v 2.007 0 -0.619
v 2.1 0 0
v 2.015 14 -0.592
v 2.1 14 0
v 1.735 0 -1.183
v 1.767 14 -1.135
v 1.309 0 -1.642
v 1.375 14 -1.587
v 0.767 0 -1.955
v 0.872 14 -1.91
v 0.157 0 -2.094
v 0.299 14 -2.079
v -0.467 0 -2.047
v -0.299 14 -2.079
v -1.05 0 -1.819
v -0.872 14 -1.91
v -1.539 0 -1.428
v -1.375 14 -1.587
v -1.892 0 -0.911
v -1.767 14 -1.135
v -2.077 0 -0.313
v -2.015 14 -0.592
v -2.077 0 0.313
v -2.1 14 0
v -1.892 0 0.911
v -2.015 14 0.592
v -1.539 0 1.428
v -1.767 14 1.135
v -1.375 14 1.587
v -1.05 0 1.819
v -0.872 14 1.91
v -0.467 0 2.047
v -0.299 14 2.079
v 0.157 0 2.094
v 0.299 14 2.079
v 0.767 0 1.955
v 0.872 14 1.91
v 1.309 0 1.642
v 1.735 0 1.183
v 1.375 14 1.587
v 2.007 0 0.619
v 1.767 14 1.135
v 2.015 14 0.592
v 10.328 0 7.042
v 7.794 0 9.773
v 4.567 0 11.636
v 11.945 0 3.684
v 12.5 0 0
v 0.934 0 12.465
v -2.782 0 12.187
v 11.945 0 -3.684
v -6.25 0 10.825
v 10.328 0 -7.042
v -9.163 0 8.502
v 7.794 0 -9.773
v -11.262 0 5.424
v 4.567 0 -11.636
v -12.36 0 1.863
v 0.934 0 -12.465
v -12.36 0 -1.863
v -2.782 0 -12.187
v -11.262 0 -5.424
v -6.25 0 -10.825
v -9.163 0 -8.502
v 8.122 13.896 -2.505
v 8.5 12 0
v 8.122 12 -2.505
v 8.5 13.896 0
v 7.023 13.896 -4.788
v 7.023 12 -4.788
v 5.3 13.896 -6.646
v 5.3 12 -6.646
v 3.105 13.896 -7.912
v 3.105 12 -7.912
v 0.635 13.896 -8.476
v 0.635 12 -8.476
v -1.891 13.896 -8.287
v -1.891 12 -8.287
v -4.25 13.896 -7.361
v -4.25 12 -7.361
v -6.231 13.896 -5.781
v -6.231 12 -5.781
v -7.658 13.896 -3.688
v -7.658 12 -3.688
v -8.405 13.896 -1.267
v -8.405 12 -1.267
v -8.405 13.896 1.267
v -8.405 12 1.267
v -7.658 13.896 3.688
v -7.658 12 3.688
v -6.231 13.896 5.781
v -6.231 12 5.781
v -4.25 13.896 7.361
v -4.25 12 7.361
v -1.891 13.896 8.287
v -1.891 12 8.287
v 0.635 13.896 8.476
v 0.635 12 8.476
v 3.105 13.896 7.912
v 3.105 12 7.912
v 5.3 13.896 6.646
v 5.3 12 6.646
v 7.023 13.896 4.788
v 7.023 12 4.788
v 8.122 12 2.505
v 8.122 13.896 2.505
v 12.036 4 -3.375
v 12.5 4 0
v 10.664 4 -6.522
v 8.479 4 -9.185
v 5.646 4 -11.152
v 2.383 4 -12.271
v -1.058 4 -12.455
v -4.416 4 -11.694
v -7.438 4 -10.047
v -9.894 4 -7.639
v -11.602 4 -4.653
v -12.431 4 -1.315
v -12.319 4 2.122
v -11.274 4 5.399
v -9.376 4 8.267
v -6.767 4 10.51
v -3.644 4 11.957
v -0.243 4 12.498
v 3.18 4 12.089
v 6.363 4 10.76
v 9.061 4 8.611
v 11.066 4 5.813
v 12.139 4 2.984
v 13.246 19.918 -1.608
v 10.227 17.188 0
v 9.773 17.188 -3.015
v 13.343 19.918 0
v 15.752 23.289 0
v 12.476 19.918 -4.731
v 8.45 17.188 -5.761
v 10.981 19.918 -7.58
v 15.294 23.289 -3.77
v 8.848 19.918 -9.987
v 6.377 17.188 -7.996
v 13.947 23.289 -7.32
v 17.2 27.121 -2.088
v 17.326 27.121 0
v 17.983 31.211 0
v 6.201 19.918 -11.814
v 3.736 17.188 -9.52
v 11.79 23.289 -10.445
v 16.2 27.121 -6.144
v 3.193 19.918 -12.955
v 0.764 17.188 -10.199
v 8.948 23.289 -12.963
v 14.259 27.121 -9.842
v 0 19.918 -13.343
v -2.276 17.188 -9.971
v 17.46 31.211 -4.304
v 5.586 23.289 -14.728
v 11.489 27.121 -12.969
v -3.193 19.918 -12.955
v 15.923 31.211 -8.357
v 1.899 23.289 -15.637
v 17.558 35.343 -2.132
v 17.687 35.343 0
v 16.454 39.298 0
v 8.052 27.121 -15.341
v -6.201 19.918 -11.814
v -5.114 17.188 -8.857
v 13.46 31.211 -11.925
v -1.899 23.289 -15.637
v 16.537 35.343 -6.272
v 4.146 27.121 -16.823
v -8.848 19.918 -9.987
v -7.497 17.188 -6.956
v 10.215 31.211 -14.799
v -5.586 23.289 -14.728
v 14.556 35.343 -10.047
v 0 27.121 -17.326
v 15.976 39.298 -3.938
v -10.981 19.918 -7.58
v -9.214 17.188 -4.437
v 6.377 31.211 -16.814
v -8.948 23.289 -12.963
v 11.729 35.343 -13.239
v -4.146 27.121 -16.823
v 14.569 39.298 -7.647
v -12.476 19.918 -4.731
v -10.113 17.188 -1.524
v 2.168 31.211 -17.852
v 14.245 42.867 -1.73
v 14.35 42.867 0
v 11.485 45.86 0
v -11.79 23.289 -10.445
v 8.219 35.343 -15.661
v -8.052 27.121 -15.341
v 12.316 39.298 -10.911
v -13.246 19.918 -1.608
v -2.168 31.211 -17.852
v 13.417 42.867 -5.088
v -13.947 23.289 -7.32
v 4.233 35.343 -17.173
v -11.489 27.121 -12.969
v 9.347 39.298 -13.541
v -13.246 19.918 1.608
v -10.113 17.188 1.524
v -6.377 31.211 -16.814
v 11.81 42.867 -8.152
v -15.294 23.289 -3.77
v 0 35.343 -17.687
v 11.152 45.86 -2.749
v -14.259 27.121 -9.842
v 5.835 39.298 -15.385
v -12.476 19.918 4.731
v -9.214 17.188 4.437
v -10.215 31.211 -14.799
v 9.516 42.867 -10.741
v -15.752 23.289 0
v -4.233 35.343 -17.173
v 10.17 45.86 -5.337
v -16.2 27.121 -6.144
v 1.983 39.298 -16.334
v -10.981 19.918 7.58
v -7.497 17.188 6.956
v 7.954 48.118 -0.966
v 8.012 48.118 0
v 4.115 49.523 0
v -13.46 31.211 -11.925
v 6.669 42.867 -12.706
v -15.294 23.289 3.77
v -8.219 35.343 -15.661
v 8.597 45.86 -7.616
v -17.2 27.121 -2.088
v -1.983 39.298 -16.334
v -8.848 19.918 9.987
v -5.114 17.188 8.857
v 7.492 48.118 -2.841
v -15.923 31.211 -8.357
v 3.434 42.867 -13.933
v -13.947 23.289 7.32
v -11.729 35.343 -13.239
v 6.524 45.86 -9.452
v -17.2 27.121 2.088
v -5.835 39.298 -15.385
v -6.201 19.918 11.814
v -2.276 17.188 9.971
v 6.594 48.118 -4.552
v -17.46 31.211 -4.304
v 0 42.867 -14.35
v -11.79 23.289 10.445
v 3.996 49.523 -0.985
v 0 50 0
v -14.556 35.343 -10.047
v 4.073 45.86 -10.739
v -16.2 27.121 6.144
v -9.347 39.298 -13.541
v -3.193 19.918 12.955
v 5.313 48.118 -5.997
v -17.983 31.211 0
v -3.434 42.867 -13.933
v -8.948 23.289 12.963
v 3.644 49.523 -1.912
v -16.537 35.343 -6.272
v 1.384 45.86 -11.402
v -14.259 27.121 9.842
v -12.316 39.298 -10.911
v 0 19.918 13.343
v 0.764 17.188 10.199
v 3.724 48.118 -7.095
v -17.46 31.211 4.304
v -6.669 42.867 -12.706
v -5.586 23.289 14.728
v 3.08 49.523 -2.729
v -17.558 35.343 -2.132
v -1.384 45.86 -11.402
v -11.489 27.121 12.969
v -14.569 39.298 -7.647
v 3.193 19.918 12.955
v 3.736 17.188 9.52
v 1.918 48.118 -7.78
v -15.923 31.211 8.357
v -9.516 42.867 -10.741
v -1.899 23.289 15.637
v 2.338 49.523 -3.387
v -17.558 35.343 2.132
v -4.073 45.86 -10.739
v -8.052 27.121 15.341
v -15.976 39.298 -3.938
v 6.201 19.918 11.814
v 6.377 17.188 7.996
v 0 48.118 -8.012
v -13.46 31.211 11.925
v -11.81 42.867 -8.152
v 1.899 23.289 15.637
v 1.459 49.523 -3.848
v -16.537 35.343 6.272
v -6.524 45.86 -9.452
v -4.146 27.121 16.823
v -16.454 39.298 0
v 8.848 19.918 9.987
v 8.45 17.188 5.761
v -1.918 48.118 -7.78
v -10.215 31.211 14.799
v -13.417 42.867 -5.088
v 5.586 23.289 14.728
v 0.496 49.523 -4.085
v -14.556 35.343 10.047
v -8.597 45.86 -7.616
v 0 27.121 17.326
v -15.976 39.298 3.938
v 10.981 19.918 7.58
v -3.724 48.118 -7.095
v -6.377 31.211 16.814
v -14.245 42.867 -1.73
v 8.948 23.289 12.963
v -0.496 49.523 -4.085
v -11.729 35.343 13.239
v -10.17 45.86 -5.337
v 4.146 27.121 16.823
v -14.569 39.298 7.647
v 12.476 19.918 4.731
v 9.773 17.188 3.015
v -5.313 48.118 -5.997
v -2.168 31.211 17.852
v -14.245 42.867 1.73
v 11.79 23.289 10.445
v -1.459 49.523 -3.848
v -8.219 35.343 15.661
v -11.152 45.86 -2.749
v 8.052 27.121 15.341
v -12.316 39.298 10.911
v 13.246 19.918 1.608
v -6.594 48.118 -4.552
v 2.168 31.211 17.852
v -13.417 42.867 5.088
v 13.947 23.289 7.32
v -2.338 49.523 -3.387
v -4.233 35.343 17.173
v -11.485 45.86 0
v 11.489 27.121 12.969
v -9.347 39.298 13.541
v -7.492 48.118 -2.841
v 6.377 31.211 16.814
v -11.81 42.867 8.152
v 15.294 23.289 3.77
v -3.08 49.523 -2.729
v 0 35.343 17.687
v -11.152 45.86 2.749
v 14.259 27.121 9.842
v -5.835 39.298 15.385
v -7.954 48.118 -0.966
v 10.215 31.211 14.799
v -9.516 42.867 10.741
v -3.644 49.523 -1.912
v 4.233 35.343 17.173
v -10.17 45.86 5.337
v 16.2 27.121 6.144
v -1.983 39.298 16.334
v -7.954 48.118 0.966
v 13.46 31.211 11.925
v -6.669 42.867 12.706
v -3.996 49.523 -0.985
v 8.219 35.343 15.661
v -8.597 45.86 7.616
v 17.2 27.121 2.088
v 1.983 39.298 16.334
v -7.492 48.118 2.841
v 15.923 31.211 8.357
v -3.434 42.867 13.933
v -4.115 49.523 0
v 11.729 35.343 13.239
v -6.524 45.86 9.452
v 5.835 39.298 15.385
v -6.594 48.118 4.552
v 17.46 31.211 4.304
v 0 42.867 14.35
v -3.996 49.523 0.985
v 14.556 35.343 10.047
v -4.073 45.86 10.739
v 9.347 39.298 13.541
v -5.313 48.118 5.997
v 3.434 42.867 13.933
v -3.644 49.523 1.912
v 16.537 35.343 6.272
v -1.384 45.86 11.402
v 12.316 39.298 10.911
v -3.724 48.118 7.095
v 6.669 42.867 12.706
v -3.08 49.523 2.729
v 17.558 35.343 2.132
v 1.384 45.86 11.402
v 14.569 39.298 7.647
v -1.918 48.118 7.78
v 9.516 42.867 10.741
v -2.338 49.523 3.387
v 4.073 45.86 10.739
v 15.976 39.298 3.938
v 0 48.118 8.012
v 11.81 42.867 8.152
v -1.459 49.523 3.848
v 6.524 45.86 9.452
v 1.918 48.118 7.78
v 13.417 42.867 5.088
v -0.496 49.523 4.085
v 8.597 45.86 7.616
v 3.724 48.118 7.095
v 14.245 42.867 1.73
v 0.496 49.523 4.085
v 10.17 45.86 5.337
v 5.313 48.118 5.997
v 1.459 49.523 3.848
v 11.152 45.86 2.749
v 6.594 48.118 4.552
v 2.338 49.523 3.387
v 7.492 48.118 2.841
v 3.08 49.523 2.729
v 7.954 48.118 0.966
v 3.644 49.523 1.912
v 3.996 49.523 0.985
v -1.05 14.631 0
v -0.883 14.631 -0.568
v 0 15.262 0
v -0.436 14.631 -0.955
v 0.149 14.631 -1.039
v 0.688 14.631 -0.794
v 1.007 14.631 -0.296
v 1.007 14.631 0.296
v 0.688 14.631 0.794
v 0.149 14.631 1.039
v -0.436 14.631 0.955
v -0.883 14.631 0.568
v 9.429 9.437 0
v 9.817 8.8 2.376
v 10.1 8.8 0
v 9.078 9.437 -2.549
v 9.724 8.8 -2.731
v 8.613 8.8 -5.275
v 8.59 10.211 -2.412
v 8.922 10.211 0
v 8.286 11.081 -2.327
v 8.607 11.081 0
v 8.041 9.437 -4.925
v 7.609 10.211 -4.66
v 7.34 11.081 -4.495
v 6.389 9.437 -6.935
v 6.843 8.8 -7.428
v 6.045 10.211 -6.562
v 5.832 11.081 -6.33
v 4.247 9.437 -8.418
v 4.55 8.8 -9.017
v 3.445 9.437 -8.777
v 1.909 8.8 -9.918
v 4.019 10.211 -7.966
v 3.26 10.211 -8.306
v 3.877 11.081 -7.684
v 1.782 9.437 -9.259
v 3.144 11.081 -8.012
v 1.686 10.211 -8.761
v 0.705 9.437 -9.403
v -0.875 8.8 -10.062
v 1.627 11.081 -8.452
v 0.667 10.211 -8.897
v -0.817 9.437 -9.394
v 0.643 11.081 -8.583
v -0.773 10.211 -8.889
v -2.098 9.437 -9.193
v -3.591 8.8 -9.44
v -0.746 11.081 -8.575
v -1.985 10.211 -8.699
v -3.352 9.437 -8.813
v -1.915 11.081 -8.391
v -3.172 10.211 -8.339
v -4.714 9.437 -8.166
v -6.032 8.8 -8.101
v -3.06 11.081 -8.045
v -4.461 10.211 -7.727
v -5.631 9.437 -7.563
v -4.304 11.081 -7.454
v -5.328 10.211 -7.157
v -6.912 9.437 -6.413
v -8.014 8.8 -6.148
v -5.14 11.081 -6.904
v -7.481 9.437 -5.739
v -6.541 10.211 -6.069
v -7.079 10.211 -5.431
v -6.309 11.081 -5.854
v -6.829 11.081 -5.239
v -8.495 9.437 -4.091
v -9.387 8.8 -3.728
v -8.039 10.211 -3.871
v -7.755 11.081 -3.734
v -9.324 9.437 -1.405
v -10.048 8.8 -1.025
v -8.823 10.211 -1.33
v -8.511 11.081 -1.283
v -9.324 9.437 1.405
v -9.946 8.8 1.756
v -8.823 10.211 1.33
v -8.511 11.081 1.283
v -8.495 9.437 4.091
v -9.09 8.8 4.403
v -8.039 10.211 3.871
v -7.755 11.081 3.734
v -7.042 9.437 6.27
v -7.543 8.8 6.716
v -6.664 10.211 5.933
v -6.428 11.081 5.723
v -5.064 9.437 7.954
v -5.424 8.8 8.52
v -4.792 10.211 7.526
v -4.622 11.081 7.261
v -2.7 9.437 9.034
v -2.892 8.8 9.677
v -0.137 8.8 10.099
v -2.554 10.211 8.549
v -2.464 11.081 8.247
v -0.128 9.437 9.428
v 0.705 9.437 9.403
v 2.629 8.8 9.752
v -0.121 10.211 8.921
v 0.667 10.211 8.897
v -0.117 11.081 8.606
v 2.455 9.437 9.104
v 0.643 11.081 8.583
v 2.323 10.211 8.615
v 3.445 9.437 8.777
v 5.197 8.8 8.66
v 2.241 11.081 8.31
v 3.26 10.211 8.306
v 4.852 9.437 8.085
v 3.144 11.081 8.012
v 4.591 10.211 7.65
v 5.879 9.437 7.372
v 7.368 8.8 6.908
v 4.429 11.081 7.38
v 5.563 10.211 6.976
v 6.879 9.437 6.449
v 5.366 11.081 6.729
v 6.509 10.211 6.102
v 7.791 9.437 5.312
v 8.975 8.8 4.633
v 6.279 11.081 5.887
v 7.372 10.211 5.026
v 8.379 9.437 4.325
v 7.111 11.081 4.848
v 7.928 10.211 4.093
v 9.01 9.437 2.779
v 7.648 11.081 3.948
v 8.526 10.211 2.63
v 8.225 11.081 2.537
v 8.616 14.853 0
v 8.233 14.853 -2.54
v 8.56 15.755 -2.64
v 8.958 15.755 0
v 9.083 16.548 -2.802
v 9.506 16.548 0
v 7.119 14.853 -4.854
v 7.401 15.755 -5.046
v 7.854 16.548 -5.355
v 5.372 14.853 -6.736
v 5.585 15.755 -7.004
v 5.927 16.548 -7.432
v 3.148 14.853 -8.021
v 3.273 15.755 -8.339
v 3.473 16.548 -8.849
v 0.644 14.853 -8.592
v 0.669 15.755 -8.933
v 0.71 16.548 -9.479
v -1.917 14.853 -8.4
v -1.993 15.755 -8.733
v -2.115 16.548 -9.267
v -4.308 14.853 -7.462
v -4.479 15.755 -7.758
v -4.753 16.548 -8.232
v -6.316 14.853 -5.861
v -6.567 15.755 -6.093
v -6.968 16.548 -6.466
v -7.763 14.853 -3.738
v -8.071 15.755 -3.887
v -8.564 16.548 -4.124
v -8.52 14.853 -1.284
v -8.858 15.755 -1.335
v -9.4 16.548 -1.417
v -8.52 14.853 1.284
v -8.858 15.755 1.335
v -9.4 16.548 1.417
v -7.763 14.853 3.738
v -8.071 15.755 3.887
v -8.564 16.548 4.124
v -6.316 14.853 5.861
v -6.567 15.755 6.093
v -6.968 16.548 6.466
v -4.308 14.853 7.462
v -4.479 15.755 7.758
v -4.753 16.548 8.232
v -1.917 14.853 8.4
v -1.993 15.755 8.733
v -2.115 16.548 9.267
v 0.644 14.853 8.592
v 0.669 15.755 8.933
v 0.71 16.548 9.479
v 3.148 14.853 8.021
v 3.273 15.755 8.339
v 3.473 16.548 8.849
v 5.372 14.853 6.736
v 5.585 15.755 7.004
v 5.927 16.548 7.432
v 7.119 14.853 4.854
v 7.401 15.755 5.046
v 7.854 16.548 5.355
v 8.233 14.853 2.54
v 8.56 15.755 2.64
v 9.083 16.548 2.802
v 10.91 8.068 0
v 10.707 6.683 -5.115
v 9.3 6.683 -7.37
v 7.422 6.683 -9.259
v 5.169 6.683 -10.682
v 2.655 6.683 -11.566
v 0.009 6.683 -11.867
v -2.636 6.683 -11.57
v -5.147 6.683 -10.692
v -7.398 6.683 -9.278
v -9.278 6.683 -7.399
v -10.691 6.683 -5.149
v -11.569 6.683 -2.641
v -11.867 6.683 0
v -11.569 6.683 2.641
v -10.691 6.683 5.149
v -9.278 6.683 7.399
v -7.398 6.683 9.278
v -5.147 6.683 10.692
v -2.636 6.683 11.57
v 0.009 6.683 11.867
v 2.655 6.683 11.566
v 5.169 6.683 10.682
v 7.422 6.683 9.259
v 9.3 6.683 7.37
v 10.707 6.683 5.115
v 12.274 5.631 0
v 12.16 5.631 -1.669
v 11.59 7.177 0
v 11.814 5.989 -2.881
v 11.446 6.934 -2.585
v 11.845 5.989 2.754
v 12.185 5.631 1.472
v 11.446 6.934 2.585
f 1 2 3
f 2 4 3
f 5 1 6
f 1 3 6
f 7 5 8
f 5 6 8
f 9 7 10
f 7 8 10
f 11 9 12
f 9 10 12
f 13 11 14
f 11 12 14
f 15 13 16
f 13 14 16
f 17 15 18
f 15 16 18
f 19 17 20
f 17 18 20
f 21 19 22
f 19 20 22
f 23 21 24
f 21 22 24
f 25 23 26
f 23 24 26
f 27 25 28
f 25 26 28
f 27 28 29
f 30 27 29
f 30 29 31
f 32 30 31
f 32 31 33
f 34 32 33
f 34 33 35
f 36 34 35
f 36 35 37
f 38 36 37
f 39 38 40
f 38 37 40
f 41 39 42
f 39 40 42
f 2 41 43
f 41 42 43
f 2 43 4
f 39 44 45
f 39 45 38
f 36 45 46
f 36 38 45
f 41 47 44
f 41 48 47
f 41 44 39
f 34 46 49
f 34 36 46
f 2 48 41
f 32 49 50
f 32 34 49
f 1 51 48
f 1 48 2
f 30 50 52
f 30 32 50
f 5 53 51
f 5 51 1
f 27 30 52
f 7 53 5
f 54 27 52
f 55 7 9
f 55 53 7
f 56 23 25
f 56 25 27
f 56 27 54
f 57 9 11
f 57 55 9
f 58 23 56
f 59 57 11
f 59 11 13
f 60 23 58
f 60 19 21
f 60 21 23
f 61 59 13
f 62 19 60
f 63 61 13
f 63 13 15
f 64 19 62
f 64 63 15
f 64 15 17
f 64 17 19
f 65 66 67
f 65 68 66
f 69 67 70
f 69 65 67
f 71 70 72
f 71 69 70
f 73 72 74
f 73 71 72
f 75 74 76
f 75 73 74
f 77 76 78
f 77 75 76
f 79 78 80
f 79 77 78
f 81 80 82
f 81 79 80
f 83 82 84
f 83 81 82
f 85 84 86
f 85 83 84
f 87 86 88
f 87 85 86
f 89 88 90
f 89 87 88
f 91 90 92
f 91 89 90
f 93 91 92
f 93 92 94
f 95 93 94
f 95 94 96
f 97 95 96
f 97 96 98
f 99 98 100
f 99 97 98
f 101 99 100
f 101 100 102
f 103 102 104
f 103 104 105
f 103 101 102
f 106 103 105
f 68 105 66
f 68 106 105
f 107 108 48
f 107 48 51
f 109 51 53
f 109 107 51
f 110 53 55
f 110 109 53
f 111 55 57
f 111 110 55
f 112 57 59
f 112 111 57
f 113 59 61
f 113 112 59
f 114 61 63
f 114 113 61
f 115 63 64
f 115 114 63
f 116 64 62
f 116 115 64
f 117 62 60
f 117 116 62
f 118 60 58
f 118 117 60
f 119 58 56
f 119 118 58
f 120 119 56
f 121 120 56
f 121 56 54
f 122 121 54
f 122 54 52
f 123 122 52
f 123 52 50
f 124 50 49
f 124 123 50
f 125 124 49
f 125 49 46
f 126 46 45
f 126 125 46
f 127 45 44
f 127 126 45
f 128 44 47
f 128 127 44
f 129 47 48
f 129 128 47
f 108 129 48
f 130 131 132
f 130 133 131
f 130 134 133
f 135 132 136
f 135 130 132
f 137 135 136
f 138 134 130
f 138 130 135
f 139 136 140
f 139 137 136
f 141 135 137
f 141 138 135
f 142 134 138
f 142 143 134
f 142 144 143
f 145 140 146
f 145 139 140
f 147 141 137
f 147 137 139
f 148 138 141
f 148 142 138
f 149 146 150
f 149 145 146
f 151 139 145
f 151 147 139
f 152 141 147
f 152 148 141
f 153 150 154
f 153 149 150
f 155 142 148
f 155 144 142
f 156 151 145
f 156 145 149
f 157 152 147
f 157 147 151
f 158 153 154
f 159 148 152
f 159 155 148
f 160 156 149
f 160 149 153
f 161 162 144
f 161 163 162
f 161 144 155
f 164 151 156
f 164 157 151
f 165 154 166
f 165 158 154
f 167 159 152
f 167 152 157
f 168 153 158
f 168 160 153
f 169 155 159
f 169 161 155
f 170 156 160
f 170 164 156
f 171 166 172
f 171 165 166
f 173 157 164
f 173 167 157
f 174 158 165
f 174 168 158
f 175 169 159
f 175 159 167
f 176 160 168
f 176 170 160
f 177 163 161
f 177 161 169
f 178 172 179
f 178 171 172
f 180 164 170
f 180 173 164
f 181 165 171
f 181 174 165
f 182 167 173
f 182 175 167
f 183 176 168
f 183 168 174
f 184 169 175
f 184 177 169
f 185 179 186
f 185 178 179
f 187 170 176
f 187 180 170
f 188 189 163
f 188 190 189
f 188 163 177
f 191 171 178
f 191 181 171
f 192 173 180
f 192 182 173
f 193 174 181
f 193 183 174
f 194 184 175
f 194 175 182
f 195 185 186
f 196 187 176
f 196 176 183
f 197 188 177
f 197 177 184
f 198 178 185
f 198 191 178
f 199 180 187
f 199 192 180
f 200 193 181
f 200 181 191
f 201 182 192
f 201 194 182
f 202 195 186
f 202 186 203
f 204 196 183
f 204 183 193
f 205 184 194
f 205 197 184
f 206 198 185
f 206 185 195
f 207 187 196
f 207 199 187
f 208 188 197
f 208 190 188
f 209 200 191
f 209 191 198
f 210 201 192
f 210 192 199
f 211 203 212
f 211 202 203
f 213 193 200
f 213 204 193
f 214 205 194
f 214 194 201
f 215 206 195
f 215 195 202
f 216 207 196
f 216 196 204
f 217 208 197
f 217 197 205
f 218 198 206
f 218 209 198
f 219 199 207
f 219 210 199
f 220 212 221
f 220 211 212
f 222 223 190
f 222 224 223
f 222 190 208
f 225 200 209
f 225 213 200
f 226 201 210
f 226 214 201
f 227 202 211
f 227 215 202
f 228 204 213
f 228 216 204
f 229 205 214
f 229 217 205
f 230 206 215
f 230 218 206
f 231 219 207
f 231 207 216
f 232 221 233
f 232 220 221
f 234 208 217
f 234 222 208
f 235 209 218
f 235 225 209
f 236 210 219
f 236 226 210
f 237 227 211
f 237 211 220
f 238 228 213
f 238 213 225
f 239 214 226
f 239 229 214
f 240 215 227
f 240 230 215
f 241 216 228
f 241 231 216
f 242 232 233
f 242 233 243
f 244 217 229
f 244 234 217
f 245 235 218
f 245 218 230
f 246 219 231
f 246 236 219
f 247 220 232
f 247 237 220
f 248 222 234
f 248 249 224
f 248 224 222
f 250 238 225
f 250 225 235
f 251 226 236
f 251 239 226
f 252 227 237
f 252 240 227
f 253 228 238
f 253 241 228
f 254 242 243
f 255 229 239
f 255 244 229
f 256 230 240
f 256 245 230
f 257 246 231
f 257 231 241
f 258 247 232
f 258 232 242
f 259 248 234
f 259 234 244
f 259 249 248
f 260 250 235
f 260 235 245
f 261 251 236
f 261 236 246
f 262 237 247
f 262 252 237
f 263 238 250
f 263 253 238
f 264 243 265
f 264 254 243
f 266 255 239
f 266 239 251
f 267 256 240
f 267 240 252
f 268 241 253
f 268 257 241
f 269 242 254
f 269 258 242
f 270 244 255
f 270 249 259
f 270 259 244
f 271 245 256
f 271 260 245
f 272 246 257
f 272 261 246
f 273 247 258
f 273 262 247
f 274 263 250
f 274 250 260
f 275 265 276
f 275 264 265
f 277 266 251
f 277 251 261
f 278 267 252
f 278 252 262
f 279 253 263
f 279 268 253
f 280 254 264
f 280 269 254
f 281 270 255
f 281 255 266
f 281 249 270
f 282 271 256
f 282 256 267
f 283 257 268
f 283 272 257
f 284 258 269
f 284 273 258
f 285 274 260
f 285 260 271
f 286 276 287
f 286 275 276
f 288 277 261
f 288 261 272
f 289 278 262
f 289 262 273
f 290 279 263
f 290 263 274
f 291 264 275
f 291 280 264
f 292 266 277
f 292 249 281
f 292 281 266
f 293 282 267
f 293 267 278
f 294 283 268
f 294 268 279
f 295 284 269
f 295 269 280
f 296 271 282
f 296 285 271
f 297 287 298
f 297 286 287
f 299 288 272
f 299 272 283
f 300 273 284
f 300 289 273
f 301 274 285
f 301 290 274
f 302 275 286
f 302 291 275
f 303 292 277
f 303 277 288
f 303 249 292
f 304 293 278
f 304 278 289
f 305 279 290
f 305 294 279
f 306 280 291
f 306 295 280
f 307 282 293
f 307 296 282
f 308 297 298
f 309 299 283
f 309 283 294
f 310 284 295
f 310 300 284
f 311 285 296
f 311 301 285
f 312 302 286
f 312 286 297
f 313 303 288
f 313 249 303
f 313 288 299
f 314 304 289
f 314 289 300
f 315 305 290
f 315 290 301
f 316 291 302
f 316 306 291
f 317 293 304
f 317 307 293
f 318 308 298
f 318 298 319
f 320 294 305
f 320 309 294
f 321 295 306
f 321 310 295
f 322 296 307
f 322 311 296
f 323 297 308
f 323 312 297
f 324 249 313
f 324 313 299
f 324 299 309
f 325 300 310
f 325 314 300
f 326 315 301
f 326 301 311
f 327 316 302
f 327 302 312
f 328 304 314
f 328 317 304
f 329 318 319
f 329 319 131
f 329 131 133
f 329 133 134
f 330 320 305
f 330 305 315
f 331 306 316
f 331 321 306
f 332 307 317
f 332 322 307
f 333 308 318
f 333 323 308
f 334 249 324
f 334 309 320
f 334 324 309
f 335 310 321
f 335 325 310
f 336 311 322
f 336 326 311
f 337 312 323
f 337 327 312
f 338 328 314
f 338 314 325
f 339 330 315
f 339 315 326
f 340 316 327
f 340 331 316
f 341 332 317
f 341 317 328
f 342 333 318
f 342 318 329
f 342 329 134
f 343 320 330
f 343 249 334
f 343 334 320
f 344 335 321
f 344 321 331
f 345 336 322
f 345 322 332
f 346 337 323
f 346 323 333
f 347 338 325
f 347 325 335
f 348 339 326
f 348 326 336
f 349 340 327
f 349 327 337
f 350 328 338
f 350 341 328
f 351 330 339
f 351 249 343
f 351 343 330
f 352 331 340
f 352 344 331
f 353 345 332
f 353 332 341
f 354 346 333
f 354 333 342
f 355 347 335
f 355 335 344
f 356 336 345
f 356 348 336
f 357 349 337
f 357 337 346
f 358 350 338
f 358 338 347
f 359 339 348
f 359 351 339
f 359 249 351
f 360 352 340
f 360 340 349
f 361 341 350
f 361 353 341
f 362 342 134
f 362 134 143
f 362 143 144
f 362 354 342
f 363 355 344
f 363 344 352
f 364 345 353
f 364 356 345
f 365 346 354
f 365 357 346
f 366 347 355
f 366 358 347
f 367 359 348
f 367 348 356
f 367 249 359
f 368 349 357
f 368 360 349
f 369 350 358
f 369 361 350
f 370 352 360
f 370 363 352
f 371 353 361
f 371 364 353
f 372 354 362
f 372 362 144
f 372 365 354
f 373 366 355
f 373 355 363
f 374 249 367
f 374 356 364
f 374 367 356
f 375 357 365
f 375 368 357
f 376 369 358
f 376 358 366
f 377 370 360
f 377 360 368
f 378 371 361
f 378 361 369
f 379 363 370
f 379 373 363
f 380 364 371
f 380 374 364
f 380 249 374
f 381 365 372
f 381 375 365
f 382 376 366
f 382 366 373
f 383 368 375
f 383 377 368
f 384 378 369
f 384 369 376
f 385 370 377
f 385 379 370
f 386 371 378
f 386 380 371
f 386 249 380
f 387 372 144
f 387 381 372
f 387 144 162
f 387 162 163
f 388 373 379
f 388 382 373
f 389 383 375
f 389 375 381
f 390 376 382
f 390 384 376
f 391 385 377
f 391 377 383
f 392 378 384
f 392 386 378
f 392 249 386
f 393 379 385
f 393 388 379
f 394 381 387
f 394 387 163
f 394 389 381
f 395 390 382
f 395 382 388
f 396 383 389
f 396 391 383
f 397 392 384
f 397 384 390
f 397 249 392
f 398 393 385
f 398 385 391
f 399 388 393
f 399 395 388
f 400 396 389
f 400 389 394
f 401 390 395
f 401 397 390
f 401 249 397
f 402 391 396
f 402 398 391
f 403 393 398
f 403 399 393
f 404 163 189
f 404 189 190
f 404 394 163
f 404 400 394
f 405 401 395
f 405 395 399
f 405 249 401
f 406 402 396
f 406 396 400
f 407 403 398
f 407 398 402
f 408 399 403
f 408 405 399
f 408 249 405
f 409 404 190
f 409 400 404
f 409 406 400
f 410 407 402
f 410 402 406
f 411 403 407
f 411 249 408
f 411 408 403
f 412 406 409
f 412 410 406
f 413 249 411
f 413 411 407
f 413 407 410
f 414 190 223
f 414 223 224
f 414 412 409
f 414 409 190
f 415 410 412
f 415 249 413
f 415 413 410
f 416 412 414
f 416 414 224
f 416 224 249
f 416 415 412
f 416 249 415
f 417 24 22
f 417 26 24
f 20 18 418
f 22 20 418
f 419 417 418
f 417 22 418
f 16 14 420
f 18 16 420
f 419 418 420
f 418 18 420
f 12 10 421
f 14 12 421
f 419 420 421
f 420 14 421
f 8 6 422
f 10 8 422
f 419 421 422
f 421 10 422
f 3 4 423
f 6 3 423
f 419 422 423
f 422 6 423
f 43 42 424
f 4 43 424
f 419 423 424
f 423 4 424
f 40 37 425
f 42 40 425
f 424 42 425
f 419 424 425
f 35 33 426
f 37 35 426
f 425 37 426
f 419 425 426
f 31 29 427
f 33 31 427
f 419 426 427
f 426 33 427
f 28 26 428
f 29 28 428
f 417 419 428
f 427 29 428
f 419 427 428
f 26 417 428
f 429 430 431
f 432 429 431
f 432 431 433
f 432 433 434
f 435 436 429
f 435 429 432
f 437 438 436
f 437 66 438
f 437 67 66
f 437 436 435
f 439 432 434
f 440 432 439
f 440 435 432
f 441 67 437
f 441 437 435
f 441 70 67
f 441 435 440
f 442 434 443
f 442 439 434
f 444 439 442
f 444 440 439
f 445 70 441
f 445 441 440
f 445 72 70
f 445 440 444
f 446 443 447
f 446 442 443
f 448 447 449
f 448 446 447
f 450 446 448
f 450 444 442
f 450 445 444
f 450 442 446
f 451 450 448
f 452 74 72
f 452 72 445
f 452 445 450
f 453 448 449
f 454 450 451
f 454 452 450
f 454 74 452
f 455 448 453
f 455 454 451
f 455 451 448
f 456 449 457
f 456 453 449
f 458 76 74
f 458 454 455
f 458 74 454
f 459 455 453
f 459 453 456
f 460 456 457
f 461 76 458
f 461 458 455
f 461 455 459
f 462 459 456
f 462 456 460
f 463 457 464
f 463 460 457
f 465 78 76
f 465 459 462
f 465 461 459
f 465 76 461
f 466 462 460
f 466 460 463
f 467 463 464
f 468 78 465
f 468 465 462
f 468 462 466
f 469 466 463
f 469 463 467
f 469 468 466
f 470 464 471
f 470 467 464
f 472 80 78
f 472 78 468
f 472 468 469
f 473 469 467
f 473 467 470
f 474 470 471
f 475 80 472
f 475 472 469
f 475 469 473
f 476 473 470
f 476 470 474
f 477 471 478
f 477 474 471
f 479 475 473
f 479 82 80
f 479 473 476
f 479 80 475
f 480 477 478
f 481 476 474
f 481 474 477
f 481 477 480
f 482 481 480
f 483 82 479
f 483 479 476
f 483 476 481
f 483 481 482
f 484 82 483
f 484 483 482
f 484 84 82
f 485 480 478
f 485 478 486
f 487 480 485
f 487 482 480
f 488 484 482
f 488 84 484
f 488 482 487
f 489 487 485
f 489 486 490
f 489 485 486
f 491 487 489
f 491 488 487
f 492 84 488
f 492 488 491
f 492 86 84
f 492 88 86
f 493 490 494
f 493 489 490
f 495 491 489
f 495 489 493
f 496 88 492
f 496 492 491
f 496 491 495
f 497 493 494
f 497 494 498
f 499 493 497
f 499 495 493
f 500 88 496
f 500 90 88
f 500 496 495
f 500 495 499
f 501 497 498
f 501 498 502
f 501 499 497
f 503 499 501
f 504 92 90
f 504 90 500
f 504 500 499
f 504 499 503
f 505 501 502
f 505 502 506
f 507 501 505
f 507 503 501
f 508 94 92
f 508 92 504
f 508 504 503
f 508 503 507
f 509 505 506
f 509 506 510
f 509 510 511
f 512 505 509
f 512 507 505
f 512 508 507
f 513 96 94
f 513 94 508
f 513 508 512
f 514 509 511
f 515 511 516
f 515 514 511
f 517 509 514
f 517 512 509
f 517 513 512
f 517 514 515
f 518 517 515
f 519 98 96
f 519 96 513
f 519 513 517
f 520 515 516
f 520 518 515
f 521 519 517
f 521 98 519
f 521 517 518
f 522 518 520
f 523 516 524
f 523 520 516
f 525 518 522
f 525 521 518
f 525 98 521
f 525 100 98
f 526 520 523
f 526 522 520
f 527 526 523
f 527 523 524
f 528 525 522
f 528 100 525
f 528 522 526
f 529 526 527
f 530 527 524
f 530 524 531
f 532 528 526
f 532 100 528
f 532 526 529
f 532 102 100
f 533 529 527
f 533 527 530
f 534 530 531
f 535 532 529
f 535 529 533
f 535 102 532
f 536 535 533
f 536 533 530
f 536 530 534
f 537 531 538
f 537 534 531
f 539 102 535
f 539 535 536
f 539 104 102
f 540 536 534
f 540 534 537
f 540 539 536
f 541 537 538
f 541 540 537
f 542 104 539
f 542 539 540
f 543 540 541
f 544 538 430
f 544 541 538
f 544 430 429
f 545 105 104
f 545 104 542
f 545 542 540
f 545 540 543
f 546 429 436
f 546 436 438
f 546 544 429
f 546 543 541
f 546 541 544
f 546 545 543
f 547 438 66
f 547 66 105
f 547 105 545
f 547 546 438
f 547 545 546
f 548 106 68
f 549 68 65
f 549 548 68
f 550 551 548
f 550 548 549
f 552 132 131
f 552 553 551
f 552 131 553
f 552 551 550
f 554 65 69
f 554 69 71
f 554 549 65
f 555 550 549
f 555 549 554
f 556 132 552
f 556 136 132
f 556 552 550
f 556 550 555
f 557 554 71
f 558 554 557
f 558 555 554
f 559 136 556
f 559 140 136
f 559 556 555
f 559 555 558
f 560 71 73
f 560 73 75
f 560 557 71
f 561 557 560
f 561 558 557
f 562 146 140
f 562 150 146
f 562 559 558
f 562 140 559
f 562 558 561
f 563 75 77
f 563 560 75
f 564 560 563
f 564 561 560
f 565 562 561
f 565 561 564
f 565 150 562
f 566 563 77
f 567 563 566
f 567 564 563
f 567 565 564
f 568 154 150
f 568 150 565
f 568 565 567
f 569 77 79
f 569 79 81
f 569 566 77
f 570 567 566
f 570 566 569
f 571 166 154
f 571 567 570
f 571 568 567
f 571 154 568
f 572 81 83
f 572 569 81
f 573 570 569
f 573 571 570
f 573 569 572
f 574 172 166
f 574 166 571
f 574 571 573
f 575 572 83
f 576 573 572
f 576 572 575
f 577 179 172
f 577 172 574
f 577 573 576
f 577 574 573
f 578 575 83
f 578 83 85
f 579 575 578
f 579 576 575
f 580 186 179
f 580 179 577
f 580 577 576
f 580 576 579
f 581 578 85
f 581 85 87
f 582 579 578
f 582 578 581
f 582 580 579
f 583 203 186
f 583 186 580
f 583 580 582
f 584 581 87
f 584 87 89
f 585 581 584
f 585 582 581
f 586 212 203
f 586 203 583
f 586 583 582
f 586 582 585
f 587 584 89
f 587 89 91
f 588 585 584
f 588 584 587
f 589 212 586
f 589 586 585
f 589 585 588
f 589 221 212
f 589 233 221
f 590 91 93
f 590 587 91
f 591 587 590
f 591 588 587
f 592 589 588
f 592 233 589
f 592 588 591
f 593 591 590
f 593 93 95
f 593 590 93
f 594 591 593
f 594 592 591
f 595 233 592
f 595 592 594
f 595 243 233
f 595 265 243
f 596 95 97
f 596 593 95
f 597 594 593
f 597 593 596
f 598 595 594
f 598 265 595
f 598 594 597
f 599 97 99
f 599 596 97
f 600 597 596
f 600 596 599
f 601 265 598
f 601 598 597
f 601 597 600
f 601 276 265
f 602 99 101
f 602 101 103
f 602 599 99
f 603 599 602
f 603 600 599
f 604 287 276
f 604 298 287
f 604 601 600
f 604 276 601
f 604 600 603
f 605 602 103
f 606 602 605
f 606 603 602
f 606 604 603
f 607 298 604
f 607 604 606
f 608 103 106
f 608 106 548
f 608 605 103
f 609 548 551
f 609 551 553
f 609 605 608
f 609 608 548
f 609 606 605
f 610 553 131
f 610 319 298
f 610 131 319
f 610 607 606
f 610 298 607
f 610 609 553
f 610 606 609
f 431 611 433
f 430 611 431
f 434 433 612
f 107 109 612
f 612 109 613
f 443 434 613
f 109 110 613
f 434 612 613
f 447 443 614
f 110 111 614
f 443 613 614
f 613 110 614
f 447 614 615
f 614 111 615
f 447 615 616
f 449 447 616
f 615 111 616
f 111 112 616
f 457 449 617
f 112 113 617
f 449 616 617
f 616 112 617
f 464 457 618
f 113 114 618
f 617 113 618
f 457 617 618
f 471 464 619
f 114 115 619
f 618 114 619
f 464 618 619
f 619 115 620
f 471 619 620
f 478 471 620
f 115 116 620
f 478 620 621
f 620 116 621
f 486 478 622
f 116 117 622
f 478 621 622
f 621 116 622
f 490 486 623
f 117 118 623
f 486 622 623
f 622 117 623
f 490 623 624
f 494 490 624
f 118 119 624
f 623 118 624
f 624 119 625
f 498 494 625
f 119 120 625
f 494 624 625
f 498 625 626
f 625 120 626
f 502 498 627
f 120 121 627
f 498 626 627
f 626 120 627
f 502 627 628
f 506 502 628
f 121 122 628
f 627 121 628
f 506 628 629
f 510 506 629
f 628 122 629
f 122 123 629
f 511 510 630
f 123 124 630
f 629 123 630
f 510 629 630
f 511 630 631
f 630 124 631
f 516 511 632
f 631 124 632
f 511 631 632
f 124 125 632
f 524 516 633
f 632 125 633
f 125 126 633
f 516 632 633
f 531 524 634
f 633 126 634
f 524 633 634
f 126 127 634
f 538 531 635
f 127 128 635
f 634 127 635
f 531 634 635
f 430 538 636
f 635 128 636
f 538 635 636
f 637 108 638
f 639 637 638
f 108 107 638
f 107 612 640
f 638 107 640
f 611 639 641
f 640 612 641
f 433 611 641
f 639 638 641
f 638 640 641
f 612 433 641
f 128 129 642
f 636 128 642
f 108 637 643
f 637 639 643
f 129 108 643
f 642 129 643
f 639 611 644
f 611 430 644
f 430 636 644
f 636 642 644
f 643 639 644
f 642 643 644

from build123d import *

# Parameters (mm, degrees)
ZAOKR_GLENIE1_R            = 6
OTW_R_GWINTOWANY_M51_D     = 4.2
OTW_R_GWINTOWANY_M51_DEPTH = 14
OTW_R_GWINTOWANY_M51_TIP   = 1.2618073


with BuildPart() as part:
    # Szkic1 → Obrót1 (revolve)
    with BuildSketch(Plane.XY):
        with BuildLine():
            Line((0, 0), (12.5, 0))
            Line((12.5, 0), (12.5, 8))
            ThreePointArc((12.5, 8), (9.671572875, 9.171572875), (8.5, 12))
            Line((8.5, 12), (8.5, 13.89613301))
            ThreePointArc((8.5, 13.89613301), (8.958043684, 15.754773764), (10.227272727, 17.18774519))
            ThreePointArc((10.227272727, 17.18774519), (17.18459465, 37.356277318), (0, 50))
            Line((0, 50), (0, 0))
        make_face()
    revolve(axis=Axis((0, 0, 0), (0, 1, 0)))

    # Zaokrąglenie1
    zaokr_glenie1_edges = [part.edges().sort_by_distance(p)[0] for p in [
        (-12.5, 8, 0),
    ]]
    fillet(zaokr_glenie1_edges, radius=ZAOKR_GLENIE1_R)

    # Otwór gwintowany M51
    with Locations(Plane(origin=(0, 0, 0), x_dir=(-1, 0, 0), z_dir=(0, -1, 0))):
        with Locations((0, 0)):
            Hole(OTW_R_GWINTOWANY_M51_D / 2, depth=OTW_R_GWINTOWANY_M51_DEPTH)
            with Locations((0, 0, -(OTW_R_GWINTOWANY_M51_DEPTH + OTW_R_GWINTOWANY_M51_TIP / 2))):  # 118° drill point
                Cone(0, OTW_R_GWINTOWANY_M51_D / 2, OTW_R_GWINTOWANY_M51_TIP, mode=Mode.SUBTRACT)


solid = part.part
